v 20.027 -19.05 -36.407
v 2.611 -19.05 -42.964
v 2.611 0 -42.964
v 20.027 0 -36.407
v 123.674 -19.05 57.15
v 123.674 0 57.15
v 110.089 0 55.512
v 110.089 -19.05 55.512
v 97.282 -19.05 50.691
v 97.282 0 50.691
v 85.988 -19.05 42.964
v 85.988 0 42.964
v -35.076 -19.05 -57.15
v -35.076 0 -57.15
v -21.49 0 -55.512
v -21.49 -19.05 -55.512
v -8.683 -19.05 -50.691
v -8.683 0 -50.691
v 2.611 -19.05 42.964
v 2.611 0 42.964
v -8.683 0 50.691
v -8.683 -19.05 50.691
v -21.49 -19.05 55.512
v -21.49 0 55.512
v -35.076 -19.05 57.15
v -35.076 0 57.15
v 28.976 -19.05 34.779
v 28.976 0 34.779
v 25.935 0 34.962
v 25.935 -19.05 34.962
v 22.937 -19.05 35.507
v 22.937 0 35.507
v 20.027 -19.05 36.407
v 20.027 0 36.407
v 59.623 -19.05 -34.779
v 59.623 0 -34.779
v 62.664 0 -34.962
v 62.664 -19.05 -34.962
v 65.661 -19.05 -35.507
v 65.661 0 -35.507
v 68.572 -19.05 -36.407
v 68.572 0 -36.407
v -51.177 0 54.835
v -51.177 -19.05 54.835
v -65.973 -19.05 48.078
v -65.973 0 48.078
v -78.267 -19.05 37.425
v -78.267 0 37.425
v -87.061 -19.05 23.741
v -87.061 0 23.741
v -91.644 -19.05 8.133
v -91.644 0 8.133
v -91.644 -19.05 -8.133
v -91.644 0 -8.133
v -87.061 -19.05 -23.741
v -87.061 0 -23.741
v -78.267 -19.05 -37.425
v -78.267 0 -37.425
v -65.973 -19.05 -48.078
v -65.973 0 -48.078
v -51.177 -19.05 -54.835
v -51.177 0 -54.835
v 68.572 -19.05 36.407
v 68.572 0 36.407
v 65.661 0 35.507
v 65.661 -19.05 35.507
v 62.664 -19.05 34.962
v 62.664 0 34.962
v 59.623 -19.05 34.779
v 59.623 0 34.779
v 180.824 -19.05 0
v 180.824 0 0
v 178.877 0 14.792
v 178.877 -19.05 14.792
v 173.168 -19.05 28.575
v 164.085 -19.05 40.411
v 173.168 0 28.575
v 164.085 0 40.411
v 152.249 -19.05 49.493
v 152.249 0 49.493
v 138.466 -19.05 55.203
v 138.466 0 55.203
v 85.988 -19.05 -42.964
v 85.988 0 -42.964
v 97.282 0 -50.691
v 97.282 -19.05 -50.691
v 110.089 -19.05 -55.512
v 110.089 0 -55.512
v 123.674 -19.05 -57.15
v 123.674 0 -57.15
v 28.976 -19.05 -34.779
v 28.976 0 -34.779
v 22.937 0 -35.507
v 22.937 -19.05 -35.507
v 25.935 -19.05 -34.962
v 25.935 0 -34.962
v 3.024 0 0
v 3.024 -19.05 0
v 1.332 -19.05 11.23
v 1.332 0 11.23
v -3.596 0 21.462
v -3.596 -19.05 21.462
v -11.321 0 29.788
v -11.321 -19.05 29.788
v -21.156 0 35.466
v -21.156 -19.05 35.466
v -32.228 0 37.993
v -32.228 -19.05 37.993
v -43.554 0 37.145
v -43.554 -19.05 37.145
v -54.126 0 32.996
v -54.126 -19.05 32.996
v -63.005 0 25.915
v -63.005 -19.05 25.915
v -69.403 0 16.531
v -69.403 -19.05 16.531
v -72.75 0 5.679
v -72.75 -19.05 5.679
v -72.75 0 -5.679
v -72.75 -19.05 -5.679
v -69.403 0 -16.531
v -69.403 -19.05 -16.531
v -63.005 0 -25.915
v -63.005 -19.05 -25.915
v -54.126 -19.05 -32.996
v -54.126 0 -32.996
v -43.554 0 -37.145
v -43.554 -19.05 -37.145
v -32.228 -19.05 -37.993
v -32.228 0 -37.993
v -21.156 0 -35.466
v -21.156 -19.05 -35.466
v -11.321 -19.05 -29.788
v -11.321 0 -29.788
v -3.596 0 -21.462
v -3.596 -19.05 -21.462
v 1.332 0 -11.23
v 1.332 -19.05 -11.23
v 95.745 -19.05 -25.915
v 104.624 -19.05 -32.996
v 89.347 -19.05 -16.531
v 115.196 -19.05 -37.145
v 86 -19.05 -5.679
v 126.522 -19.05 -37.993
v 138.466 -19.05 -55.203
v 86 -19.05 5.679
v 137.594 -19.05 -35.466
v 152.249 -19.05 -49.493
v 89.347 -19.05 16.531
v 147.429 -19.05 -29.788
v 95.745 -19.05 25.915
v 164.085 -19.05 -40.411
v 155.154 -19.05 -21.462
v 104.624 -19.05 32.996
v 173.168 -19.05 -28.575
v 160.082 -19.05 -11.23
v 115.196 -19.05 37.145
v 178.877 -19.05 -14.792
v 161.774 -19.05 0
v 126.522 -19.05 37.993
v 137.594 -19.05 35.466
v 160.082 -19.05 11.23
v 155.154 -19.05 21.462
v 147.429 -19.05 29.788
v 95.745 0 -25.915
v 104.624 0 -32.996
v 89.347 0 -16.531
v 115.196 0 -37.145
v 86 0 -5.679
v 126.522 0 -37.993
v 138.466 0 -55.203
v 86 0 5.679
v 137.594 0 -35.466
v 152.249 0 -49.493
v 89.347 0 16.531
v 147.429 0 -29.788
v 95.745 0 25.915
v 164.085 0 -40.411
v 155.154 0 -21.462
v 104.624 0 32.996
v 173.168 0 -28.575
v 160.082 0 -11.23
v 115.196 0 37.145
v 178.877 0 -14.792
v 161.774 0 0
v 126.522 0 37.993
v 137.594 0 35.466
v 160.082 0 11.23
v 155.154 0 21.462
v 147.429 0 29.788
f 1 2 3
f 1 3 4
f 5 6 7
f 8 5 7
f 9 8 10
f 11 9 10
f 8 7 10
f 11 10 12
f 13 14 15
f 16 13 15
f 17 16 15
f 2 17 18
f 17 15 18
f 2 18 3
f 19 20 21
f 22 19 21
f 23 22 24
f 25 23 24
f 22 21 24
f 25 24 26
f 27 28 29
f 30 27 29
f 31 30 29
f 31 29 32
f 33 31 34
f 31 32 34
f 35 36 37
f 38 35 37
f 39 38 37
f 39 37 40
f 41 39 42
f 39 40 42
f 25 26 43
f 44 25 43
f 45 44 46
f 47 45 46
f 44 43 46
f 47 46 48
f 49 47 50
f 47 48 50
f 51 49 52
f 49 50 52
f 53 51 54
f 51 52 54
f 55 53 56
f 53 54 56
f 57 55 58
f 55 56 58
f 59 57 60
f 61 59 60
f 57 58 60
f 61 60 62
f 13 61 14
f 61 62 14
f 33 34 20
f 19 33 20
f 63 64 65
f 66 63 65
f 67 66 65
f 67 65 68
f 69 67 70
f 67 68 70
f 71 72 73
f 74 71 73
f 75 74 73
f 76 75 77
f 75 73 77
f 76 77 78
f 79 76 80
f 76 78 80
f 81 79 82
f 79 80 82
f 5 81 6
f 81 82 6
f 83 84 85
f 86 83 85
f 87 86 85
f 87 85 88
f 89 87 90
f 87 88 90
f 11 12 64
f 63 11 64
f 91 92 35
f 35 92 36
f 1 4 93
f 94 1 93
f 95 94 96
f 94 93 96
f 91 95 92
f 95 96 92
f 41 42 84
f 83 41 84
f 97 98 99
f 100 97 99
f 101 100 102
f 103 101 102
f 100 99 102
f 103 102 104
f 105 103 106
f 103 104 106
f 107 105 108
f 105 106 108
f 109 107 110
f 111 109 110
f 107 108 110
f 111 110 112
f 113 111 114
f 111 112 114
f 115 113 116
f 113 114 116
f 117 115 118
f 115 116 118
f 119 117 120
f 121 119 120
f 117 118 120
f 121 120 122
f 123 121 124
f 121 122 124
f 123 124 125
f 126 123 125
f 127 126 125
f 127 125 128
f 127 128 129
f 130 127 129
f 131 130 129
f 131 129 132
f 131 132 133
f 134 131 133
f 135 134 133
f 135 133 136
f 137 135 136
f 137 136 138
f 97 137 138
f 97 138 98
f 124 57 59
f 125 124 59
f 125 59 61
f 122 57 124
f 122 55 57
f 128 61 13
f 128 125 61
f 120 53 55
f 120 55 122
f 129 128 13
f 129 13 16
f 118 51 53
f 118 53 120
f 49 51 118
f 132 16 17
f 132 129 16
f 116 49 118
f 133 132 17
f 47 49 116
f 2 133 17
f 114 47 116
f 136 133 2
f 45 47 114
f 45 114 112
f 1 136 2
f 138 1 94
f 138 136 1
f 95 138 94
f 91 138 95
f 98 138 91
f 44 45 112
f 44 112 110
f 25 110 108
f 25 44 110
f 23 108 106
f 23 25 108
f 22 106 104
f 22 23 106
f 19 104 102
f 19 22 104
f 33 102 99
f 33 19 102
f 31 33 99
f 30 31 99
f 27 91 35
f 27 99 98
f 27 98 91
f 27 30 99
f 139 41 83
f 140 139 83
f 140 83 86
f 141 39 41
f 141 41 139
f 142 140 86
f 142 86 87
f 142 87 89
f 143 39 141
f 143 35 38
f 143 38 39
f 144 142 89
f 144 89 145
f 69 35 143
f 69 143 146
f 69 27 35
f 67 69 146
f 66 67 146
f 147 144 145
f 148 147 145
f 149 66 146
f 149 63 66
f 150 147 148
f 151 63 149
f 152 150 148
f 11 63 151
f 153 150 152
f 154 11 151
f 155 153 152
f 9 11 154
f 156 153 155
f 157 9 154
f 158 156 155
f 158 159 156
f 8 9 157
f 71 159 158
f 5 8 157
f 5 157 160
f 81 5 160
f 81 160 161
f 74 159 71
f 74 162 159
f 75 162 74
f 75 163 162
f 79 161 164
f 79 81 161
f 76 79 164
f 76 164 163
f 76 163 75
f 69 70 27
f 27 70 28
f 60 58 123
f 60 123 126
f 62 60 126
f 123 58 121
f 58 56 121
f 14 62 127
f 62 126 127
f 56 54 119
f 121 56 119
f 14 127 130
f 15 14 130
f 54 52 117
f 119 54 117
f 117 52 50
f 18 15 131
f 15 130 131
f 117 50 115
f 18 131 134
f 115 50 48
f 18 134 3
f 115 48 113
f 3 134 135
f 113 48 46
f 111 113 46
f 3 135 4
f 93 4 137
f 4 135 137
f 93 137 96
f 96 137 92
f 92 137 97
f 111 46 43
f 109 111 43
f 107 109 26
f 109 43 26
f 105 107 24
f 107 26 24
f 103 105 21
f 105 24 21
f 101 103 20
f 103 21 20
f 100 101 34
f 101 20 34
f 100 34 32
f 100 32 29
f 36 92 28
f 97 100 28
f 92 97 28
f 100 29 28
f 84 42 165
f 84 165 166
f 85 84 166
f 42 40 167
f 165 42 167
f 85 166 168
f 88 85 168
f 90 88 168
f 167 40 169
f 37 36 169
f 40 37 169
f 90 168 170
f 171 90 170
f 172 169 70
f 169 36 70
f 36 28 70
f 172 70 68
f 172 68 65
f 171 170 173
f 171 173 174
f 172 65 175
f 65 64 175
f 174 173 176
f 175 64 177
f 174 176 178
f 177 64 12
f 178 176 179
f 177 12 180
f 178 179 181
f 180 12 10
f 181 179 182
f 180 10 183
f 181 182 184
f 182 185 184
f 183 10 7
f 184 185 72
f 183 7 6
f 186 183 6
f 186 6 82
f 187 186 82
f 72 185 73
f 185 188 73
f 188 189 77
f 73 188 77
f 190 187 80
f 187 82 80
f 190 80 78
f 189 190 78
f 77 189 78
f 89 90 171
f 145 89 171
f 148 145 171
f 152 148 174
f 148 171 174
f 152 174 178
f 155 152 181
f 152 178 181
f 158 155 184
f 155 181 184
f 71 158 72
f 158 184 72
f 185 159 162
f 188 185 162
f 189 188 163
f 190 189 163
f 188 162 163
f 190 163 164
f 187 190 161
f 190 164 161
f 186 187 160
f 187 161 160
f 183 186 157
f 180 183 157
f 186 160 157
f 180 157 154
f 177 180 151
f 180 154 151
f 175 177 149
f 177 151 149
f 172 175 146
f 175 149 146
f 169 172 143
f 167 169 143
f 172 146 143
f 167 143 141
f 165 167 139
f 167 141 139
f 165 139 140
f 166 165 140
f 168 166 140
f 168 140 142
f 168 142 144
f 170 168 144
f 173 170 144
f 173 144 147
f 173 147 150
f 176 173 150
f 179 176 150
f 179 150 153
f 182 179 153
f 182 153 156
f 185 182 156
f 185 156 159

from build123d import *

# Parameters (mm, degrees)
F1_DEPTH = 19.05
F2_R     = 38.1
F3_DEPTH = 25.4


with BuildPart() as f1:
    # F0 (on Front) → F1 (new body)
    with BuildSketch(Plane.XZ):
        with BuildLine():
            Line((20.027097595, 36.4074036121), (2.6105293283, 42.9636023111))
            ThreePointArc((2.6105293283, 42.9636023111), (16.9814393634, 23.5834144733), (22.0743066938, 0))
            ThreePointArc((22.0743066938, 0), (16.9814393634, -23.5834144733), (2.6105293283, -42.9636023111))
            Line((2.6105293283, -42.9636023111), (20.027097595, -36.4074036121))
            ThreePointArc((20.027097595, -36.4074036121), (24.4278254251, -35.189367606), (28.975523916, -34.7789341976))
            Line((28.975523916, -34.7789341976), (59.6230894717, -34.7789341976))
            ThreePointArc((59.6230894717, -34.7789341976), (64.1707879626, -35.189367606), (68.5715157927, -36.4074036121))
            Line((68.5715157927, -36.4074036121), (85.9880840594, -42.9636023111))
            ThreePointArc((85.9880840594, -42.9636023111), (66.5243066938, 0), (85.9880840594, 42.9636023111))
            Line((85.9880840594, 42.9636023111), (68.5715157927, 36.4074036121))
            ThreePointArc((68.5715157927, 36.4074036121), (64.1707879626, 35.189367606), (59.6230894717, 34.7789341976))
            Line((59.6230894717, 34.7789341976), (28.975523916, 34.7789341976))
            ThreePointArc((28.975523916, 34.7789341976), (24.4278254251, 35.189367606), (20.027097595, 36.4074036121))
        make_face()
        with BuildLine():
            ThreePointArc((2.6105293283, 42.9636023111), (-14.941734084, 53.4859438174), (-35.0756933062, 57.15))
            Line((-35.0756933062, 57.15), (2.6105293283, 42.9636023111))
        make_face()
        with BuildLine():
            Line((123.6743066938, 57.15), (85.9880840594, 42.9636023111))
            ThreePointArc((85.9880840594, 42.9636023111), (66.5243066938, 0), (85.9880840594, -42.9636023111))
            Line((85.9880840594, -42.9636023111), (123.6743066938, -57.15))
            ThreePointArc((123.6743066938, -57.15), (164.0854592386, -40.4111525448), (180.8243066938, 0))
            ThreePointArc((180.8243066938, 0), (164.0854592386, 40.4111525448), (123.6743066938, 57.15))
        make_face()
        with BuildLine():
            ThreePointArc((123.6743066938, 57.15), (103.5403474717, 53.4859438174), (85.9880840594, 42.9636023111))
            Line((85.9880840594, 42.9636023111), (123.6743066938, 57.15))
        make_face()
        with BuildLine():
            Line((2.6105293283, 42.9636023111), (-35.0756933062, 57.15))
            ThreePointArc((-35.0756933062, 57.15), (-92.2256933062, 0), (-35.0756933062, -57.15))
            Line((-35.0756933062, -57.15), (2.6105293283, -42.9636023111))
            ThreePointArc((2.6105293283, -42.9636023111), (16.9814393634, -23.5834144733), (22.0743066938, 0))
            ThreePointArc((22.0743066938, 0), (16.9814393634, 23.5834144733), (2.6105293283, 42.9636023111))
        make_face()
        with BuildLine():
            Line((2.6105293283, -42.9636023111), (-35.0756933062, -57.15))
            ThreePointArc((-35.0756933062, -57.15), (-14.941734084, -53.4859438174), (2.6105293283, -42.9636023111))
        make_face()
        with BuildLine():
            Line((123.6743066938, -57.15), (85.9880840594, -42.9636023111))
            ThreePointArc((85.9880840594, -42.9636023111), (103.5403474717, -53.4859438174), (123.6743066938, -57.15))
        make_face()
    extrude(amount=F1_DEPTH)

    # F2 (on face) → F3 (cut)
    with BuildSketch(Plane.XZ.offset(19.05)):
        with Locations((-35.0756933062, 0)):
            Circle(F2_R)
        with Locations((123.6743066938, 0)):
            Circle(F2_R)
    extrude(amount=-F3_DEPTH, mode=Mode.SUBTRACT)


solid = f1.part
